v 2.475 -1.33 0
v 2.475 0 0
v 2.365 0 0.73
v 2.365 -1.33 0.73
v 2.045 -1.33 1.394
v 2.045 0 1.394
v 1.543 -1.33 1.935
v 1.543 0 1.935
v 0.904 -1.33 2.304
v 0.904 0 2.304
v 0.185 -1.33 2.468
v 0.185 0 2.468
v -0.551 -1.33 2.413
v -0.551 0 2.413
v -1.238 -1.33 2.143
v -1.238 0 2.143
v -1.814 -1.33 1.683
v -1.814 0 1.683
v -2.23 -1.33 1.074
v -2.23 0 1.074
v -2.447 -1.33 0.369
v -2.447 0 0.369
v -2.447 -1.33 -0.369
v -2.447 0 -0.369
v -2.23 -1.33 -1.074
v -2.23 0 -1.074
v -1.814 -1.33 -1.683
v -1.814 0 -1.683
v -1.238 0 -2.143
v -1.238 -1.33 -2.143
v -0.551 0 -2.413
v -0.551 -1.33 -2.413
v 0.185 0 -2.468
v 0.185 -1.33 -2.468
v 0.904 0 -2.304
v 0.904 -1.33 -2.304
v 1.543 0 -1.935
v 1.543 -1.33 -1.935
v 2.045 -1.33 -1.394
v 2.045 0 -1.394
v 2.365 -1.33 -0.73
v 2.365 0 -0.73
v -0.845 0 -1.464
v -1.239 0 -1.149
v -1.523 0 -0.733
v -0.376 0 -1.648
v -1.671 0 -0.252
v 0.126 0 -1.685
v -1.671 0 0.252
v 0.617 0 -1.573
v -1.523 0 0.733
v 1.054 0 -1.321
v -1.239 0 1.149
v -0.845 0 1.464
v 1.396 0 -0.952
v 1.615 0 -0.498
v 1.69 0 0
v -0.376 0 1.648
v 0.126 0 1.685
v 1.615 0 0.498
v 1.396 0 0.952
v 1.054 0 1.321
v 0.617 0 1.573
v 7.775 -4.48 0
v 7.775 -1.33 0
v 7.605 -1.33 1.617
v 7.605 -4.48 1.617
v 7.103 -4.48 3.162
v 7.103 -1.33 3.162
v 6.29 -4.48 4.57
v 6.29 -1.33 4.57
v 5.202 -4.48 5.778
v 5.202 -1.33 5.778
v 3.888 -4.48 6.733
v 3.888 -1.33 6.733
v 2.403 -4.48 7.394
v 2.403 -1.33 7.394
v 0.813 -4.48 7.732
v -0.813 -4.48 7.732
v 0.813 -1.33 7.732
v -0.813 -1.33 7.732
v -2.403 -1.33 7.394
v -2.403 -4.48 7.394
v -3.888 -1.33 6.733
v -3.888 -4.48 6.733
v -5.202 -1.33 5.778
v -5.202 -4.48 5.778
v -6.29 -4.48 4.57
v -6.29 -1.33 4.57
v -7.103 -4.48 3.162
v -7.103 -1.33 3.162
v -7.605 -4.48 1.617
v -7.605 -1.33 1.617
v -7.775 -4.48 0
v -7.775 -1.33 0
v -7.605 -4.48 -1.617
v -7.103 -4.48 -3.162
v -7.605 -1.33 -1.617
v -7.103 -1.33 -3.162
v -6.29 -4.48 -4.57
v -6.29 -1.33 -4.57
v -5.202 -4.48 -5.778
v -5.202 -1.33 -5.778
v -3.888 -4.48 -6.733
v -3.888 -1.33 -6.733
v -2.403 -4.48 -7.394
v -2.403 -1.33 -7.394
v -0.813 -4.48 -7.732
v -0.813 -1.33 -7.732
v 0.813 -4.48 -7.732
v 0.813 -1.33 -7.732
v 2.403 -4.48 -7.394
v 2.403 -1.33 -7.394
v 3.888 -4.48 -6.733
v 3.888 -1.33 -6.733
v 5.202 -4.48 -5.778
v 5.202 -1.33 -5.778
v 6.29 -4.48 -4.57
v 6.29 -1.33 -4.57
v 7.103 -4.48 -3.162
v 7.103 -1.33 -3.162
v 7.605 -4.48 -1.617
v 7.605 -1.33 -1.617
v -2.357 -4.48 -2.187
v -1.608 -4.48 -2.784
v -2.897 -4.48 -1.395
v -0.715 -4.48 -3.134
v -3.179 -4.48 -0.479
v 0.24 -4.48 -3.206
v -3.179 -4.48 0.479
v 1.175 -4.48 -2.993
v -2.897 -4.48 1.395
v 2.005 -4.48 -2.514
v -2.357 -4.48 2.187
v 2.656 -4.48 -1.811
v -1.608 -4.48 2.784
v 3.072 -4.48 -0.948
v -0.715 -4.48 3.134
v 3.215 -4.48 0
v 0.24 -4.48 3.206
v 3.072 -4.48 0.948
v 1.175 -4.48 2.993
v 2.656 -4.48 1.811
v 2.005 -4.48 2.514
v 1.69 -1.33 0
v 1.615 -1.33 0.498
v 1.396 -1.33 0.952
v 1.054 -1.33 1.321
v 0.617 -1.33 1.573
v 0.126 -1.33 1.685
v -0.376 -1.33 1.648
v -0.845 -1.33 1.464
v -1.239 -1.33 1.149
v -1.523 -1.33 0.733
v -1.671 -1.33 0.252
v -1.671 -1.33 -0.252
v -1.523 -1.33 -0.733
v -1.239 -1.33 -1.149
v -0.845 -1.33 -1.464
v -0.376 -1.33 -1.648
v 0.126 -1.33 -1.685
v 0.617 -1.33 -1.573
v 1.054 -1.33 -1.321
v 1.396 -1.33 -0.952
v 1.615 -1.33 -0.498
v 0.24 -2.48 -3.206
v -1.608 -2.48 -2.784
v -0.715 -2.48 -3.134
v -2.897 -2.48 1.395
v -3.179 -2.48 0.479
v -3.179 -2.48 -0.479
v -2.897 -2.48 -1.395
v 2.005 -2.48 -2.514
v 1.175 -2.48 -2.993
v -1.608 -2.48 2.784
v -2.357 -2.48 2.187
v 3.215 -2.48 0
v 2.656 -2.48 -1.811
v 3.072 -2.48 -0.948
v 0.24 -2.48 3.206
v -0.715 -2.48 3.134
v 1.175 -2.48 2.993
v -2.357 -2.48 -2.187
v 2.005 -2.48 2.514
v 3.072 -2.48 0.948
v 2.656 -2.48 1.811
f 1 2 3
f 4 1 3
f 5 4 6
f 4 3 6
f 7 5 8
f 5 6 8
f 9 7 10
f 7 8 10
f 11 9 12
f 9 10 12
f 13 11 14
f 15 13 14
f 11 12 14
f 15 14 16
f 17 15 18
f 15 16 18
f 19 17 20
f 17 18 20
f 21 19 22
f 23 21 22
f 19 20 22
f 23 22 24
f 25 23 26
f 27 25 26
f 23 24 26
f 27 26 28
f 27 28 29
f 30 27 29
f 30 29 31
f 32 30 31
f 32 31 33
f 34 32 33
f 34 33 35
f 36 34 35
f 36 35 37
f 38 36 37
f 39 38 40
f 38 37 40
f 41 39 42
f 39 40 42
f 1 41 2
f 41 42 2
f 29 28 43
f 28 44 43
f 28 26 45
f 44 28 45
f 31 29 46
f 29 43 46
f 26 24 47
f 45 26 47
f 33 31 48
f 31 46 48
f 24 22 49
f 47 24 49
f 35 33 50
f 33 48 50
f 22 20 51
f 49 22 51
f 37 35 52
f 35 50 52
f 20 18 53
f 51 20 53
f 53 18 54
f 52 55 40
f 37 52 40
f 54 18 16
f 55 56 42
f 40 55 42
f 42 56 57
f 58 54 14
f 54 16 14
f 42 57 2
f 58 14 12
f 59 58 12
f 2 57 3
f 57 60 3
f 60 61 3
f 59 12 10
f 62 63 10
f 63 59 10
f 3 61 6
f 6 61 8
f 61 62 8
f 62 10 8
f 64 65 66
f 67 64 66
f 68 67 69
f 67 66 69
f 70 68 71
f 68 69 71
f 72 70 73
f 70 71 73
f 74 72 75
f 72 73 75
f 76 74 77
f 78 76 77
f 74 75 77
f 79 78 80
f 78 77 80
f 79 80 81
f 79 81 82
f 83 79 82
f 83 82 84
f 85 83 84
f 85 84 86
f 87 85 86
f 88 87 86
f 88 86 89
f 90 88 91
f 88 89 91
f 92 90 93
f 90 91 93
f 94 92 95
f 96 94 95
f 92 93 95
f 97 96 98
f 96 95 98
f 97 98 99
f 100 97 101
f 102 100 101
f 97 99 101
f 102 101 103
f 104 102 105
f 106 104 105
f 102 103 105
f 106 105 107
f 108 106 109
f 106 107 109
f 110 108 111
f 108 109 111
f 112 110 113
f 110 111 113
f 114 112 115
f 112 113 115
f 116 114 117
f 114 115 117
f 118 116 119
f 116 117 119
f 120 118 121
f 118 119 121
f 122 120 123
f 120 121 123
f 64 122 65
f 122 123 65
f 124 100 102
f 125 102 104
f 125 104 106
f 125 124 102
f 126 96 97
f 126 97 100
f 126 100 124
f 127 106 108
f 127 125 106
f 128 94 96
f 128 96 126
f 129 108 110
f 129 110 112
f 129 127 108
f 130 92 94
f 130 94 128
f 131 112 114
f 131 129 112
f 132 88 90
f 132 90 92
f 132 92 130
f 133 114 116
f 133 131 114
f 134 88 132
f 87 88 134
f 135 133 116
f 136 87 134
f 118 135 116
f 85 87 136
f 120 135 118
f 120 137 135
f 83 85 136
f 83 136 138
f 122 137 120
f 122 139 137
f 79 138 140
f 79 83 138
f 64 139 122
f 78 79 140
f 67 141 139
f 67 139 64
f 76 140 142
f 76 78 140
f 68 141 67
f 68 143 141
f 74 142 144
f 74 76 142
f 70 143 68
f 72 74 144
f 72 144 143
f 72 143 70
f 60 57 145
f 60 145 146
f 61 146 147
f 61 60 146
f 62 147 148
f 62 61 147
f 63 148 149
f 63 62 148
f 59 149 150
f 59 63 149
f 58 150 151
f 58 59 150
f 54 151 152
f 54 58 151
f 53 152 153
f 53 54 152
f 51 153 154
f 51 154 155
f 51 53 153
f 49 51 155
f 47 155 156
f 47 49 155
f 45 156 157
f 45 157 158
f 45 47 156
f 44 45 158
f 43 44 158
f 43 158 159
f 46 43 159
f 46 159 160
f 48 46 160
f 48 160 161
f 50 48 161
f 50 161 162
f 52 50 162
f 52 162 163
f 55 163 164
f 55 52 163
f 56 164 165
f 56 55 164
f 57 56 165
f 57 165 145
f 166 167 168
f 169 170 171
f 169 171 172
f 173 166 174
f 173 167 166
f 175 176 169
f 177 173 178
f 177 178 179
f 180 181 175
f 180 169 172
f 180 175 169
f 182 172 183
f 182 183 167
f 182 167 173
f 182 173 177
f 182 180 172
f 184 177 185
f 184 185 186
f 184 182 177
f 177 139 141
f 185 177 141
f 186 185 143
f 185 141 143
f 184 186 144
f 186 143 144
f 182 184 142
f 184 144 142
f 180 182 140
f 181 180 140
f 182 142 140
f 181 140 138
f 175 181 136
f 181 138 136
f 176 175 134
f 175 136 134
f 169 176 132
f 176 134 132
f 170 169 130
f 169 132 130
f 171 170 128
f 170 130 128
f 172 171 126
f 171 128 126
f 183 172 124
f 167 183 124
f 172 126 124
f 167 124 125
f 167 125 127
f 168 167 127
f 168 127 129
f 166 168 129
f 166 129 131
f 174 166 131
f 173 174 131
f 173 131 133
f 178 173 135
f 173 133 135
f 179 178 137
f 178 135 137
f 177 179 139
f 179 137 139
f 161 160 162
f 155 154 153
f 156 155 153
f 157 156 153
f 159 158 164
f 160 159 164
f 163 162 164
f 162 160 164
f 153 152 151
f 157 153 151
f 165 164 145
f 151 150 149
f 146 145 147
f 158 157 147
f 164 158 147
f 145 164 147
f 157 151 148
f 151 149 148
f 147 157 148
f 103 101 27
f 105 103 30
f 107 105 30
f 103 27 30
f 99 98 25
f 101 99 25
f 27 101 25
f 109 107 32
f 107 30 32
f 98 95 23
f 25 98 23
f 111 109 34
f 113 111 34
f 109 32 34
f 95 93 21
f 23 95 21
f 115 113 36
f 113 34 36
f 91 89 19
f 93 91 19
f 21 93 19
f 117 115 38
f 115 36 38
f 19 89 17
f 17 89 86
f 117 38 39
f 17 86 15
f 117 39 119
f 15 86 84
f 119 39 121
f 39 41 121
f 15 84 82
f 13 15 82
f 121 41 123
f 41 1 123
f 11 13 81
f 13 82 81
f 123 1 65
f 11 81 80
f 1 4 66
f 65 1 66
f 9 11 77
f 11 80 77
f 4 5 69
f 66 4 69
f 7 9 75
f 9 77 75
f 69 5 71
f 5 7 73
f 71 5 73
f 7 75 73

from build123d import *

# Parameters (mm, degrees)
F0_R     = 2.475
F0_R_2   = 1.69
F1_DEPTH = 1.33
F2_R     = 7.775
F3_DEPTH = 3.15
F4_R     = 3.215
F5_DEPTH = 2


with BuildPart() as f1:
    # F0 (on Front) → F1 (new body)
    with BuildSketch(Plane.XZ):
        Circle(F0_R)
        Circle(F0_R_2, mode=Mode.SUBTRACT)
    extrude(amount=F1_DEPTH)

    # F2 (on face) → F3 (join)
    with BuildSketch(Plane.XZ.offset(1.33)):
        Circle(F2_R)
    extrude(amount=F3_DEPTH)

    # F4 (on face) → F5 (cut)
    with BuildSketch(Plane.XZ.offset(4.48)):
        Circle(F4_R)
    extrude(amount=-F5_DEPTH, mode=Mode.SUBTRACT)


solid = f1.part
